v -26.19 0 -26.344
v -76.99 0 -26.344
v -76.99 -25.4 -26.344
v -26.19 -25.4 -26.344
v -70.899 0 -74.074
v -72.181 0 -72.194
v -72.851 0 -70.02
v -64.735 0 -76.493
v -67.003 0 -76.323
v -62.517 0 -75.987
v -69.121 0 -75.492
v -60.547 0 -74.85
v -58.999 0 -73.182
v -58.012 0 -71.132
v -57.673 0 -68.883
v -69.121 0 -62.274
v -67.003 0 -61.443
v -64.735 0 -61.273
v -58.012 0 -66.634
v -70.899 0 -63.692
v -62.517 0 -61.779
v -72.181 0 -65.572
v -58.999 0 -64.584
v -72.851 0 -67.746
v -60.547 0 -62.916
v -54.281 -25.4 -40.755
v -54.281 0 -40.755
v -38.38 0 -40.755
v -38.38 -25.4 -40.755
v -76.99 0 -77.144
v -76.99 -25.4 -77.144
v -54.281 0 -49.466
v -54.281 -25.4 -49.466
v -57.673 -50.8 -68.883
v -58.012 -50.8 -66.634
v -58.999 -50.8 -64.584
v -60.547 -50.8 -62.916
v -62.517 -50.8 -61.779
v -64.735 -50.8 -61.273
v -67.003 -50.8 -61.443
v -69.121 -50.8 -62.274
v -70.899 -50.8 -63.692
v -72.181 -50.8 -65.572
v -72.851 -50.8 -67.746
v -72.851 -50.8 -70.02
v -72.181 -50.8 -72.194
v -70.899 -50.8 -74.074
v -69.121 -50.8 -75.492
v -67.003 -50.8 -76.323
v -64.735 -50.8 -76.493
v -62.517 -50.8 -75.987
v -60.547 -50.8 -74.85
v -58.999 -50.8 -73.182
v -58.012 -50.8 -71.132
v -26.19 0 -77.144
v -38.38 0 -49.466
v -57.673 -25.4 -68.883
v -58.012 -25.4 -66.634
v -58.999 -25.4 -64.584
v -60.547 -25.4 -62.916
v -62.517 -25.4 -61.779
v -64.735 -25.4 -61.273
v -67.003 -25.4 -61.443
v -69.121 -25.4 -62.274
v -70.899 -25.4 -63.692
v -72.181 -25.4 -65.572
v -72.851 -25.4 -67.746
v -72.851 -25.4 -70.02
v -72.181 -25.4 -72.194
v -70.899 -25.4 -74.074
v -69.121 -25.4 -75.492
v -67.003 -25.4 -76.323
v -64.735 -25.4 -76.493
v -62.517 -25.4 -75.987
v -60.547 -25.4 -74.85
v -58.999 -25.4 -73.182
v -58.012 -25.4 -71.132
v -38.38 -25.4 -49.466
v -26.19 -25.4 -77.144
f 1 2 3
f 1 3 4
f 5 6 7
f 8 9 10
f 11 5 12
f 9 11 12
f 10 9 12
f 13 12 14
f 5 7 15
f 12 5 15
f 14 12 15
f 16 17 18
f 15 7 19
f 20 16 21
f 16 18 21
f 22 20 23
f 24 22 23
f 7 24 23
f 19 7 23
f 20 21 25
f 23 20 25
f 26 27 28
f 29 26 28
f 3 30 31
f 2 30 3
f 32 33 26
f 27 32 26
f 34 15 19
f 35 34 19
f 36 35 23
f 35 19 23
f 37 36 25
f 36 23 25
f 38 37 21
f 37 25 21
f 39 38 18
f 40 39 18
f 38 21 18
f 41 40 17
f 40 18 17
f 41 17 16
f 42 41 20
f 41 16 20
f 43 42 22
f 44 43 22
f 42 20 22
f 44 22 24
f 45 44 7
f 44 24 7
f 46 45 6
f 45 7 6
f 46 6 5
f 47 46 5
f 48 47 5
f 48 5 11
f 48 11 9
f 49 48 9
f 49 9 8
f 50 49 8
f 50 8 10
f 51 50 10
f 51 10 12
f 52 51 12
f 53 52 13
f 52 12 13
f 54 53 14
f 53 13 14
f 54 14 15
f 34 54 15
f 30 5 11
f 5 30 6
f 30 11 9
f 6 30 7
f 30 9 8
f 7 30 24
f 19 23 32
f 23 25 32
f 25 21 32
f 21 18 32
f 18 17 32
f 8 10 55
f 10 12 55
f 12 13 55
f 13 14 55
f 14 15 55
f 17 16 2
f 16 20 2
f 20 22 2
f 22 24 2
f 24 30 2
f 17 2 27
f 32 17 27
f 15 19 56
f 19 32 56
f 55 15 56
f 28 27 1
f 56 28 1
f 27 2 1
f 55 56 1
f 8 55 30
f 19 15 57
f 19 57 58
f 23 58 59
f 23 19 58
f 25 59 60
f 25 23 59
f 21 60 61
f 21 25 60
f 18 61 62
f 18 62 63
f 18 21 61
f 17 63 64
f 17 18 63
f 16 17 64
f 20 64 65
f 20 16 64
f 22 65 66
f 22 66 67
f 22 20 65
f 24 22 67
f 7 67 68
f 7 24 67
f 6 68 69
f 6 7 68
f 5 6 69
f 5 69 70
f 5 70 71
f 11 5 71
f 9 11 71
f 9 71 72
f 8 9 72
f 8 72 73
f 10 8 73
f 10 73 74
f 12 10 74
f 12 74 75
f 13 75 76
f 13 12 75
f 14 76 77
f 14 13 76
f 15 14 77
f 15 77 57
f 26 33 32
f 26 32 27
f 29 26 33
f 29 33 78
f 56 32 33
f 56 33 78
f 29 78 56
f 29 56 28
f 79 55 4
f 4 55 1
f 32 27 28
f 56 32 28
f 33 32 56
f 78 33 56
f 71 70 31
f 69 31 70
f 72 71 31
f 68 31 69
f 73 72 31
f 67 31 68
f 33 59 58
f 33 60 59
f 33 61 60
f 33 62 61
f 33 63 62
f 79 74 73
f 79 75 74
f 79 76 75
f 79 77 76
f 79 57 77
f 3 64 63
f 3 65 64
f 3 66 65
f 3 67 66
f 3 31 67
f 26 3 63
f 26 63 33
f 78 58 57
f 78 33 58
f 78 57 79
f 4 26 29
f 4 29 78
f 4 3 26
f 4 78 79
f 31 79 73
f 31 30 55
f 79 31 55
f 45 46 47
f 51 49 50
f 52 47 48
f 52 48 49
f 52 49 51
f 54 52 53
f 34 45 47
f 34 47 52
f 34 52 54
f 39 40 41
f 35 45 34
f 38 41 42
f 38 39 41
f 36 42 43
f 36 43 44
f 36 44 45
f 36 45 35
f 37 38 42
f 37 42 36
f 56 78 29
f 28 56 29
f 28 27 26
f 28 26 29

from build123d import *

# Parameters (mm, degrees)
F0_W     = 15.90186
F0_H     = 8.711457
F1_DEPTH = 25.4
F0_R     = 7.631491
F2_DEPTH = 50.8
F0_W_2   = 50.8
F0_H_2   = 50.8
F3_DEPTH = 25.4


with BuildPart() as f1:
    # F0 (on Front) → F1 (new body)
    with BuildSketch(Plane.XZ):
        with Locations((-46.330543, -45.110445)):
            Rectangle(F0_W, F0_H)
    extrude(amount=F1_DEPTH)


with BuildPart() as f2:
    # F0 (on Front) → F2 (new body)
    with BuildSketch(Plane.XZ):
        with Locations((-65.30489, -68.882987)):
            Circle(F0_R)
    extrude(amount=F2_DEPTH)


with BuildPart() as f3:
    # F0 (on Front) → F3 (new body)
    with BuildSketch(Plane.XZ):
        with Locations((-51.590448, -51.743596)):
            Rectangle(F0_W_2, F0_H_2)
        with Locations((-65.30489, -68.882987)):
            Circle(F0_R, mode=Mode.SUBTRACT)
        with Locations((-46.330543, -45.110445)):
            Rectangle(F0_W, F0_H, mode=Mode.SUBTRACT)
    extrude(amount=F3_DEPTH)


solid = Compound([f1.part, f2.part, f3.part])
